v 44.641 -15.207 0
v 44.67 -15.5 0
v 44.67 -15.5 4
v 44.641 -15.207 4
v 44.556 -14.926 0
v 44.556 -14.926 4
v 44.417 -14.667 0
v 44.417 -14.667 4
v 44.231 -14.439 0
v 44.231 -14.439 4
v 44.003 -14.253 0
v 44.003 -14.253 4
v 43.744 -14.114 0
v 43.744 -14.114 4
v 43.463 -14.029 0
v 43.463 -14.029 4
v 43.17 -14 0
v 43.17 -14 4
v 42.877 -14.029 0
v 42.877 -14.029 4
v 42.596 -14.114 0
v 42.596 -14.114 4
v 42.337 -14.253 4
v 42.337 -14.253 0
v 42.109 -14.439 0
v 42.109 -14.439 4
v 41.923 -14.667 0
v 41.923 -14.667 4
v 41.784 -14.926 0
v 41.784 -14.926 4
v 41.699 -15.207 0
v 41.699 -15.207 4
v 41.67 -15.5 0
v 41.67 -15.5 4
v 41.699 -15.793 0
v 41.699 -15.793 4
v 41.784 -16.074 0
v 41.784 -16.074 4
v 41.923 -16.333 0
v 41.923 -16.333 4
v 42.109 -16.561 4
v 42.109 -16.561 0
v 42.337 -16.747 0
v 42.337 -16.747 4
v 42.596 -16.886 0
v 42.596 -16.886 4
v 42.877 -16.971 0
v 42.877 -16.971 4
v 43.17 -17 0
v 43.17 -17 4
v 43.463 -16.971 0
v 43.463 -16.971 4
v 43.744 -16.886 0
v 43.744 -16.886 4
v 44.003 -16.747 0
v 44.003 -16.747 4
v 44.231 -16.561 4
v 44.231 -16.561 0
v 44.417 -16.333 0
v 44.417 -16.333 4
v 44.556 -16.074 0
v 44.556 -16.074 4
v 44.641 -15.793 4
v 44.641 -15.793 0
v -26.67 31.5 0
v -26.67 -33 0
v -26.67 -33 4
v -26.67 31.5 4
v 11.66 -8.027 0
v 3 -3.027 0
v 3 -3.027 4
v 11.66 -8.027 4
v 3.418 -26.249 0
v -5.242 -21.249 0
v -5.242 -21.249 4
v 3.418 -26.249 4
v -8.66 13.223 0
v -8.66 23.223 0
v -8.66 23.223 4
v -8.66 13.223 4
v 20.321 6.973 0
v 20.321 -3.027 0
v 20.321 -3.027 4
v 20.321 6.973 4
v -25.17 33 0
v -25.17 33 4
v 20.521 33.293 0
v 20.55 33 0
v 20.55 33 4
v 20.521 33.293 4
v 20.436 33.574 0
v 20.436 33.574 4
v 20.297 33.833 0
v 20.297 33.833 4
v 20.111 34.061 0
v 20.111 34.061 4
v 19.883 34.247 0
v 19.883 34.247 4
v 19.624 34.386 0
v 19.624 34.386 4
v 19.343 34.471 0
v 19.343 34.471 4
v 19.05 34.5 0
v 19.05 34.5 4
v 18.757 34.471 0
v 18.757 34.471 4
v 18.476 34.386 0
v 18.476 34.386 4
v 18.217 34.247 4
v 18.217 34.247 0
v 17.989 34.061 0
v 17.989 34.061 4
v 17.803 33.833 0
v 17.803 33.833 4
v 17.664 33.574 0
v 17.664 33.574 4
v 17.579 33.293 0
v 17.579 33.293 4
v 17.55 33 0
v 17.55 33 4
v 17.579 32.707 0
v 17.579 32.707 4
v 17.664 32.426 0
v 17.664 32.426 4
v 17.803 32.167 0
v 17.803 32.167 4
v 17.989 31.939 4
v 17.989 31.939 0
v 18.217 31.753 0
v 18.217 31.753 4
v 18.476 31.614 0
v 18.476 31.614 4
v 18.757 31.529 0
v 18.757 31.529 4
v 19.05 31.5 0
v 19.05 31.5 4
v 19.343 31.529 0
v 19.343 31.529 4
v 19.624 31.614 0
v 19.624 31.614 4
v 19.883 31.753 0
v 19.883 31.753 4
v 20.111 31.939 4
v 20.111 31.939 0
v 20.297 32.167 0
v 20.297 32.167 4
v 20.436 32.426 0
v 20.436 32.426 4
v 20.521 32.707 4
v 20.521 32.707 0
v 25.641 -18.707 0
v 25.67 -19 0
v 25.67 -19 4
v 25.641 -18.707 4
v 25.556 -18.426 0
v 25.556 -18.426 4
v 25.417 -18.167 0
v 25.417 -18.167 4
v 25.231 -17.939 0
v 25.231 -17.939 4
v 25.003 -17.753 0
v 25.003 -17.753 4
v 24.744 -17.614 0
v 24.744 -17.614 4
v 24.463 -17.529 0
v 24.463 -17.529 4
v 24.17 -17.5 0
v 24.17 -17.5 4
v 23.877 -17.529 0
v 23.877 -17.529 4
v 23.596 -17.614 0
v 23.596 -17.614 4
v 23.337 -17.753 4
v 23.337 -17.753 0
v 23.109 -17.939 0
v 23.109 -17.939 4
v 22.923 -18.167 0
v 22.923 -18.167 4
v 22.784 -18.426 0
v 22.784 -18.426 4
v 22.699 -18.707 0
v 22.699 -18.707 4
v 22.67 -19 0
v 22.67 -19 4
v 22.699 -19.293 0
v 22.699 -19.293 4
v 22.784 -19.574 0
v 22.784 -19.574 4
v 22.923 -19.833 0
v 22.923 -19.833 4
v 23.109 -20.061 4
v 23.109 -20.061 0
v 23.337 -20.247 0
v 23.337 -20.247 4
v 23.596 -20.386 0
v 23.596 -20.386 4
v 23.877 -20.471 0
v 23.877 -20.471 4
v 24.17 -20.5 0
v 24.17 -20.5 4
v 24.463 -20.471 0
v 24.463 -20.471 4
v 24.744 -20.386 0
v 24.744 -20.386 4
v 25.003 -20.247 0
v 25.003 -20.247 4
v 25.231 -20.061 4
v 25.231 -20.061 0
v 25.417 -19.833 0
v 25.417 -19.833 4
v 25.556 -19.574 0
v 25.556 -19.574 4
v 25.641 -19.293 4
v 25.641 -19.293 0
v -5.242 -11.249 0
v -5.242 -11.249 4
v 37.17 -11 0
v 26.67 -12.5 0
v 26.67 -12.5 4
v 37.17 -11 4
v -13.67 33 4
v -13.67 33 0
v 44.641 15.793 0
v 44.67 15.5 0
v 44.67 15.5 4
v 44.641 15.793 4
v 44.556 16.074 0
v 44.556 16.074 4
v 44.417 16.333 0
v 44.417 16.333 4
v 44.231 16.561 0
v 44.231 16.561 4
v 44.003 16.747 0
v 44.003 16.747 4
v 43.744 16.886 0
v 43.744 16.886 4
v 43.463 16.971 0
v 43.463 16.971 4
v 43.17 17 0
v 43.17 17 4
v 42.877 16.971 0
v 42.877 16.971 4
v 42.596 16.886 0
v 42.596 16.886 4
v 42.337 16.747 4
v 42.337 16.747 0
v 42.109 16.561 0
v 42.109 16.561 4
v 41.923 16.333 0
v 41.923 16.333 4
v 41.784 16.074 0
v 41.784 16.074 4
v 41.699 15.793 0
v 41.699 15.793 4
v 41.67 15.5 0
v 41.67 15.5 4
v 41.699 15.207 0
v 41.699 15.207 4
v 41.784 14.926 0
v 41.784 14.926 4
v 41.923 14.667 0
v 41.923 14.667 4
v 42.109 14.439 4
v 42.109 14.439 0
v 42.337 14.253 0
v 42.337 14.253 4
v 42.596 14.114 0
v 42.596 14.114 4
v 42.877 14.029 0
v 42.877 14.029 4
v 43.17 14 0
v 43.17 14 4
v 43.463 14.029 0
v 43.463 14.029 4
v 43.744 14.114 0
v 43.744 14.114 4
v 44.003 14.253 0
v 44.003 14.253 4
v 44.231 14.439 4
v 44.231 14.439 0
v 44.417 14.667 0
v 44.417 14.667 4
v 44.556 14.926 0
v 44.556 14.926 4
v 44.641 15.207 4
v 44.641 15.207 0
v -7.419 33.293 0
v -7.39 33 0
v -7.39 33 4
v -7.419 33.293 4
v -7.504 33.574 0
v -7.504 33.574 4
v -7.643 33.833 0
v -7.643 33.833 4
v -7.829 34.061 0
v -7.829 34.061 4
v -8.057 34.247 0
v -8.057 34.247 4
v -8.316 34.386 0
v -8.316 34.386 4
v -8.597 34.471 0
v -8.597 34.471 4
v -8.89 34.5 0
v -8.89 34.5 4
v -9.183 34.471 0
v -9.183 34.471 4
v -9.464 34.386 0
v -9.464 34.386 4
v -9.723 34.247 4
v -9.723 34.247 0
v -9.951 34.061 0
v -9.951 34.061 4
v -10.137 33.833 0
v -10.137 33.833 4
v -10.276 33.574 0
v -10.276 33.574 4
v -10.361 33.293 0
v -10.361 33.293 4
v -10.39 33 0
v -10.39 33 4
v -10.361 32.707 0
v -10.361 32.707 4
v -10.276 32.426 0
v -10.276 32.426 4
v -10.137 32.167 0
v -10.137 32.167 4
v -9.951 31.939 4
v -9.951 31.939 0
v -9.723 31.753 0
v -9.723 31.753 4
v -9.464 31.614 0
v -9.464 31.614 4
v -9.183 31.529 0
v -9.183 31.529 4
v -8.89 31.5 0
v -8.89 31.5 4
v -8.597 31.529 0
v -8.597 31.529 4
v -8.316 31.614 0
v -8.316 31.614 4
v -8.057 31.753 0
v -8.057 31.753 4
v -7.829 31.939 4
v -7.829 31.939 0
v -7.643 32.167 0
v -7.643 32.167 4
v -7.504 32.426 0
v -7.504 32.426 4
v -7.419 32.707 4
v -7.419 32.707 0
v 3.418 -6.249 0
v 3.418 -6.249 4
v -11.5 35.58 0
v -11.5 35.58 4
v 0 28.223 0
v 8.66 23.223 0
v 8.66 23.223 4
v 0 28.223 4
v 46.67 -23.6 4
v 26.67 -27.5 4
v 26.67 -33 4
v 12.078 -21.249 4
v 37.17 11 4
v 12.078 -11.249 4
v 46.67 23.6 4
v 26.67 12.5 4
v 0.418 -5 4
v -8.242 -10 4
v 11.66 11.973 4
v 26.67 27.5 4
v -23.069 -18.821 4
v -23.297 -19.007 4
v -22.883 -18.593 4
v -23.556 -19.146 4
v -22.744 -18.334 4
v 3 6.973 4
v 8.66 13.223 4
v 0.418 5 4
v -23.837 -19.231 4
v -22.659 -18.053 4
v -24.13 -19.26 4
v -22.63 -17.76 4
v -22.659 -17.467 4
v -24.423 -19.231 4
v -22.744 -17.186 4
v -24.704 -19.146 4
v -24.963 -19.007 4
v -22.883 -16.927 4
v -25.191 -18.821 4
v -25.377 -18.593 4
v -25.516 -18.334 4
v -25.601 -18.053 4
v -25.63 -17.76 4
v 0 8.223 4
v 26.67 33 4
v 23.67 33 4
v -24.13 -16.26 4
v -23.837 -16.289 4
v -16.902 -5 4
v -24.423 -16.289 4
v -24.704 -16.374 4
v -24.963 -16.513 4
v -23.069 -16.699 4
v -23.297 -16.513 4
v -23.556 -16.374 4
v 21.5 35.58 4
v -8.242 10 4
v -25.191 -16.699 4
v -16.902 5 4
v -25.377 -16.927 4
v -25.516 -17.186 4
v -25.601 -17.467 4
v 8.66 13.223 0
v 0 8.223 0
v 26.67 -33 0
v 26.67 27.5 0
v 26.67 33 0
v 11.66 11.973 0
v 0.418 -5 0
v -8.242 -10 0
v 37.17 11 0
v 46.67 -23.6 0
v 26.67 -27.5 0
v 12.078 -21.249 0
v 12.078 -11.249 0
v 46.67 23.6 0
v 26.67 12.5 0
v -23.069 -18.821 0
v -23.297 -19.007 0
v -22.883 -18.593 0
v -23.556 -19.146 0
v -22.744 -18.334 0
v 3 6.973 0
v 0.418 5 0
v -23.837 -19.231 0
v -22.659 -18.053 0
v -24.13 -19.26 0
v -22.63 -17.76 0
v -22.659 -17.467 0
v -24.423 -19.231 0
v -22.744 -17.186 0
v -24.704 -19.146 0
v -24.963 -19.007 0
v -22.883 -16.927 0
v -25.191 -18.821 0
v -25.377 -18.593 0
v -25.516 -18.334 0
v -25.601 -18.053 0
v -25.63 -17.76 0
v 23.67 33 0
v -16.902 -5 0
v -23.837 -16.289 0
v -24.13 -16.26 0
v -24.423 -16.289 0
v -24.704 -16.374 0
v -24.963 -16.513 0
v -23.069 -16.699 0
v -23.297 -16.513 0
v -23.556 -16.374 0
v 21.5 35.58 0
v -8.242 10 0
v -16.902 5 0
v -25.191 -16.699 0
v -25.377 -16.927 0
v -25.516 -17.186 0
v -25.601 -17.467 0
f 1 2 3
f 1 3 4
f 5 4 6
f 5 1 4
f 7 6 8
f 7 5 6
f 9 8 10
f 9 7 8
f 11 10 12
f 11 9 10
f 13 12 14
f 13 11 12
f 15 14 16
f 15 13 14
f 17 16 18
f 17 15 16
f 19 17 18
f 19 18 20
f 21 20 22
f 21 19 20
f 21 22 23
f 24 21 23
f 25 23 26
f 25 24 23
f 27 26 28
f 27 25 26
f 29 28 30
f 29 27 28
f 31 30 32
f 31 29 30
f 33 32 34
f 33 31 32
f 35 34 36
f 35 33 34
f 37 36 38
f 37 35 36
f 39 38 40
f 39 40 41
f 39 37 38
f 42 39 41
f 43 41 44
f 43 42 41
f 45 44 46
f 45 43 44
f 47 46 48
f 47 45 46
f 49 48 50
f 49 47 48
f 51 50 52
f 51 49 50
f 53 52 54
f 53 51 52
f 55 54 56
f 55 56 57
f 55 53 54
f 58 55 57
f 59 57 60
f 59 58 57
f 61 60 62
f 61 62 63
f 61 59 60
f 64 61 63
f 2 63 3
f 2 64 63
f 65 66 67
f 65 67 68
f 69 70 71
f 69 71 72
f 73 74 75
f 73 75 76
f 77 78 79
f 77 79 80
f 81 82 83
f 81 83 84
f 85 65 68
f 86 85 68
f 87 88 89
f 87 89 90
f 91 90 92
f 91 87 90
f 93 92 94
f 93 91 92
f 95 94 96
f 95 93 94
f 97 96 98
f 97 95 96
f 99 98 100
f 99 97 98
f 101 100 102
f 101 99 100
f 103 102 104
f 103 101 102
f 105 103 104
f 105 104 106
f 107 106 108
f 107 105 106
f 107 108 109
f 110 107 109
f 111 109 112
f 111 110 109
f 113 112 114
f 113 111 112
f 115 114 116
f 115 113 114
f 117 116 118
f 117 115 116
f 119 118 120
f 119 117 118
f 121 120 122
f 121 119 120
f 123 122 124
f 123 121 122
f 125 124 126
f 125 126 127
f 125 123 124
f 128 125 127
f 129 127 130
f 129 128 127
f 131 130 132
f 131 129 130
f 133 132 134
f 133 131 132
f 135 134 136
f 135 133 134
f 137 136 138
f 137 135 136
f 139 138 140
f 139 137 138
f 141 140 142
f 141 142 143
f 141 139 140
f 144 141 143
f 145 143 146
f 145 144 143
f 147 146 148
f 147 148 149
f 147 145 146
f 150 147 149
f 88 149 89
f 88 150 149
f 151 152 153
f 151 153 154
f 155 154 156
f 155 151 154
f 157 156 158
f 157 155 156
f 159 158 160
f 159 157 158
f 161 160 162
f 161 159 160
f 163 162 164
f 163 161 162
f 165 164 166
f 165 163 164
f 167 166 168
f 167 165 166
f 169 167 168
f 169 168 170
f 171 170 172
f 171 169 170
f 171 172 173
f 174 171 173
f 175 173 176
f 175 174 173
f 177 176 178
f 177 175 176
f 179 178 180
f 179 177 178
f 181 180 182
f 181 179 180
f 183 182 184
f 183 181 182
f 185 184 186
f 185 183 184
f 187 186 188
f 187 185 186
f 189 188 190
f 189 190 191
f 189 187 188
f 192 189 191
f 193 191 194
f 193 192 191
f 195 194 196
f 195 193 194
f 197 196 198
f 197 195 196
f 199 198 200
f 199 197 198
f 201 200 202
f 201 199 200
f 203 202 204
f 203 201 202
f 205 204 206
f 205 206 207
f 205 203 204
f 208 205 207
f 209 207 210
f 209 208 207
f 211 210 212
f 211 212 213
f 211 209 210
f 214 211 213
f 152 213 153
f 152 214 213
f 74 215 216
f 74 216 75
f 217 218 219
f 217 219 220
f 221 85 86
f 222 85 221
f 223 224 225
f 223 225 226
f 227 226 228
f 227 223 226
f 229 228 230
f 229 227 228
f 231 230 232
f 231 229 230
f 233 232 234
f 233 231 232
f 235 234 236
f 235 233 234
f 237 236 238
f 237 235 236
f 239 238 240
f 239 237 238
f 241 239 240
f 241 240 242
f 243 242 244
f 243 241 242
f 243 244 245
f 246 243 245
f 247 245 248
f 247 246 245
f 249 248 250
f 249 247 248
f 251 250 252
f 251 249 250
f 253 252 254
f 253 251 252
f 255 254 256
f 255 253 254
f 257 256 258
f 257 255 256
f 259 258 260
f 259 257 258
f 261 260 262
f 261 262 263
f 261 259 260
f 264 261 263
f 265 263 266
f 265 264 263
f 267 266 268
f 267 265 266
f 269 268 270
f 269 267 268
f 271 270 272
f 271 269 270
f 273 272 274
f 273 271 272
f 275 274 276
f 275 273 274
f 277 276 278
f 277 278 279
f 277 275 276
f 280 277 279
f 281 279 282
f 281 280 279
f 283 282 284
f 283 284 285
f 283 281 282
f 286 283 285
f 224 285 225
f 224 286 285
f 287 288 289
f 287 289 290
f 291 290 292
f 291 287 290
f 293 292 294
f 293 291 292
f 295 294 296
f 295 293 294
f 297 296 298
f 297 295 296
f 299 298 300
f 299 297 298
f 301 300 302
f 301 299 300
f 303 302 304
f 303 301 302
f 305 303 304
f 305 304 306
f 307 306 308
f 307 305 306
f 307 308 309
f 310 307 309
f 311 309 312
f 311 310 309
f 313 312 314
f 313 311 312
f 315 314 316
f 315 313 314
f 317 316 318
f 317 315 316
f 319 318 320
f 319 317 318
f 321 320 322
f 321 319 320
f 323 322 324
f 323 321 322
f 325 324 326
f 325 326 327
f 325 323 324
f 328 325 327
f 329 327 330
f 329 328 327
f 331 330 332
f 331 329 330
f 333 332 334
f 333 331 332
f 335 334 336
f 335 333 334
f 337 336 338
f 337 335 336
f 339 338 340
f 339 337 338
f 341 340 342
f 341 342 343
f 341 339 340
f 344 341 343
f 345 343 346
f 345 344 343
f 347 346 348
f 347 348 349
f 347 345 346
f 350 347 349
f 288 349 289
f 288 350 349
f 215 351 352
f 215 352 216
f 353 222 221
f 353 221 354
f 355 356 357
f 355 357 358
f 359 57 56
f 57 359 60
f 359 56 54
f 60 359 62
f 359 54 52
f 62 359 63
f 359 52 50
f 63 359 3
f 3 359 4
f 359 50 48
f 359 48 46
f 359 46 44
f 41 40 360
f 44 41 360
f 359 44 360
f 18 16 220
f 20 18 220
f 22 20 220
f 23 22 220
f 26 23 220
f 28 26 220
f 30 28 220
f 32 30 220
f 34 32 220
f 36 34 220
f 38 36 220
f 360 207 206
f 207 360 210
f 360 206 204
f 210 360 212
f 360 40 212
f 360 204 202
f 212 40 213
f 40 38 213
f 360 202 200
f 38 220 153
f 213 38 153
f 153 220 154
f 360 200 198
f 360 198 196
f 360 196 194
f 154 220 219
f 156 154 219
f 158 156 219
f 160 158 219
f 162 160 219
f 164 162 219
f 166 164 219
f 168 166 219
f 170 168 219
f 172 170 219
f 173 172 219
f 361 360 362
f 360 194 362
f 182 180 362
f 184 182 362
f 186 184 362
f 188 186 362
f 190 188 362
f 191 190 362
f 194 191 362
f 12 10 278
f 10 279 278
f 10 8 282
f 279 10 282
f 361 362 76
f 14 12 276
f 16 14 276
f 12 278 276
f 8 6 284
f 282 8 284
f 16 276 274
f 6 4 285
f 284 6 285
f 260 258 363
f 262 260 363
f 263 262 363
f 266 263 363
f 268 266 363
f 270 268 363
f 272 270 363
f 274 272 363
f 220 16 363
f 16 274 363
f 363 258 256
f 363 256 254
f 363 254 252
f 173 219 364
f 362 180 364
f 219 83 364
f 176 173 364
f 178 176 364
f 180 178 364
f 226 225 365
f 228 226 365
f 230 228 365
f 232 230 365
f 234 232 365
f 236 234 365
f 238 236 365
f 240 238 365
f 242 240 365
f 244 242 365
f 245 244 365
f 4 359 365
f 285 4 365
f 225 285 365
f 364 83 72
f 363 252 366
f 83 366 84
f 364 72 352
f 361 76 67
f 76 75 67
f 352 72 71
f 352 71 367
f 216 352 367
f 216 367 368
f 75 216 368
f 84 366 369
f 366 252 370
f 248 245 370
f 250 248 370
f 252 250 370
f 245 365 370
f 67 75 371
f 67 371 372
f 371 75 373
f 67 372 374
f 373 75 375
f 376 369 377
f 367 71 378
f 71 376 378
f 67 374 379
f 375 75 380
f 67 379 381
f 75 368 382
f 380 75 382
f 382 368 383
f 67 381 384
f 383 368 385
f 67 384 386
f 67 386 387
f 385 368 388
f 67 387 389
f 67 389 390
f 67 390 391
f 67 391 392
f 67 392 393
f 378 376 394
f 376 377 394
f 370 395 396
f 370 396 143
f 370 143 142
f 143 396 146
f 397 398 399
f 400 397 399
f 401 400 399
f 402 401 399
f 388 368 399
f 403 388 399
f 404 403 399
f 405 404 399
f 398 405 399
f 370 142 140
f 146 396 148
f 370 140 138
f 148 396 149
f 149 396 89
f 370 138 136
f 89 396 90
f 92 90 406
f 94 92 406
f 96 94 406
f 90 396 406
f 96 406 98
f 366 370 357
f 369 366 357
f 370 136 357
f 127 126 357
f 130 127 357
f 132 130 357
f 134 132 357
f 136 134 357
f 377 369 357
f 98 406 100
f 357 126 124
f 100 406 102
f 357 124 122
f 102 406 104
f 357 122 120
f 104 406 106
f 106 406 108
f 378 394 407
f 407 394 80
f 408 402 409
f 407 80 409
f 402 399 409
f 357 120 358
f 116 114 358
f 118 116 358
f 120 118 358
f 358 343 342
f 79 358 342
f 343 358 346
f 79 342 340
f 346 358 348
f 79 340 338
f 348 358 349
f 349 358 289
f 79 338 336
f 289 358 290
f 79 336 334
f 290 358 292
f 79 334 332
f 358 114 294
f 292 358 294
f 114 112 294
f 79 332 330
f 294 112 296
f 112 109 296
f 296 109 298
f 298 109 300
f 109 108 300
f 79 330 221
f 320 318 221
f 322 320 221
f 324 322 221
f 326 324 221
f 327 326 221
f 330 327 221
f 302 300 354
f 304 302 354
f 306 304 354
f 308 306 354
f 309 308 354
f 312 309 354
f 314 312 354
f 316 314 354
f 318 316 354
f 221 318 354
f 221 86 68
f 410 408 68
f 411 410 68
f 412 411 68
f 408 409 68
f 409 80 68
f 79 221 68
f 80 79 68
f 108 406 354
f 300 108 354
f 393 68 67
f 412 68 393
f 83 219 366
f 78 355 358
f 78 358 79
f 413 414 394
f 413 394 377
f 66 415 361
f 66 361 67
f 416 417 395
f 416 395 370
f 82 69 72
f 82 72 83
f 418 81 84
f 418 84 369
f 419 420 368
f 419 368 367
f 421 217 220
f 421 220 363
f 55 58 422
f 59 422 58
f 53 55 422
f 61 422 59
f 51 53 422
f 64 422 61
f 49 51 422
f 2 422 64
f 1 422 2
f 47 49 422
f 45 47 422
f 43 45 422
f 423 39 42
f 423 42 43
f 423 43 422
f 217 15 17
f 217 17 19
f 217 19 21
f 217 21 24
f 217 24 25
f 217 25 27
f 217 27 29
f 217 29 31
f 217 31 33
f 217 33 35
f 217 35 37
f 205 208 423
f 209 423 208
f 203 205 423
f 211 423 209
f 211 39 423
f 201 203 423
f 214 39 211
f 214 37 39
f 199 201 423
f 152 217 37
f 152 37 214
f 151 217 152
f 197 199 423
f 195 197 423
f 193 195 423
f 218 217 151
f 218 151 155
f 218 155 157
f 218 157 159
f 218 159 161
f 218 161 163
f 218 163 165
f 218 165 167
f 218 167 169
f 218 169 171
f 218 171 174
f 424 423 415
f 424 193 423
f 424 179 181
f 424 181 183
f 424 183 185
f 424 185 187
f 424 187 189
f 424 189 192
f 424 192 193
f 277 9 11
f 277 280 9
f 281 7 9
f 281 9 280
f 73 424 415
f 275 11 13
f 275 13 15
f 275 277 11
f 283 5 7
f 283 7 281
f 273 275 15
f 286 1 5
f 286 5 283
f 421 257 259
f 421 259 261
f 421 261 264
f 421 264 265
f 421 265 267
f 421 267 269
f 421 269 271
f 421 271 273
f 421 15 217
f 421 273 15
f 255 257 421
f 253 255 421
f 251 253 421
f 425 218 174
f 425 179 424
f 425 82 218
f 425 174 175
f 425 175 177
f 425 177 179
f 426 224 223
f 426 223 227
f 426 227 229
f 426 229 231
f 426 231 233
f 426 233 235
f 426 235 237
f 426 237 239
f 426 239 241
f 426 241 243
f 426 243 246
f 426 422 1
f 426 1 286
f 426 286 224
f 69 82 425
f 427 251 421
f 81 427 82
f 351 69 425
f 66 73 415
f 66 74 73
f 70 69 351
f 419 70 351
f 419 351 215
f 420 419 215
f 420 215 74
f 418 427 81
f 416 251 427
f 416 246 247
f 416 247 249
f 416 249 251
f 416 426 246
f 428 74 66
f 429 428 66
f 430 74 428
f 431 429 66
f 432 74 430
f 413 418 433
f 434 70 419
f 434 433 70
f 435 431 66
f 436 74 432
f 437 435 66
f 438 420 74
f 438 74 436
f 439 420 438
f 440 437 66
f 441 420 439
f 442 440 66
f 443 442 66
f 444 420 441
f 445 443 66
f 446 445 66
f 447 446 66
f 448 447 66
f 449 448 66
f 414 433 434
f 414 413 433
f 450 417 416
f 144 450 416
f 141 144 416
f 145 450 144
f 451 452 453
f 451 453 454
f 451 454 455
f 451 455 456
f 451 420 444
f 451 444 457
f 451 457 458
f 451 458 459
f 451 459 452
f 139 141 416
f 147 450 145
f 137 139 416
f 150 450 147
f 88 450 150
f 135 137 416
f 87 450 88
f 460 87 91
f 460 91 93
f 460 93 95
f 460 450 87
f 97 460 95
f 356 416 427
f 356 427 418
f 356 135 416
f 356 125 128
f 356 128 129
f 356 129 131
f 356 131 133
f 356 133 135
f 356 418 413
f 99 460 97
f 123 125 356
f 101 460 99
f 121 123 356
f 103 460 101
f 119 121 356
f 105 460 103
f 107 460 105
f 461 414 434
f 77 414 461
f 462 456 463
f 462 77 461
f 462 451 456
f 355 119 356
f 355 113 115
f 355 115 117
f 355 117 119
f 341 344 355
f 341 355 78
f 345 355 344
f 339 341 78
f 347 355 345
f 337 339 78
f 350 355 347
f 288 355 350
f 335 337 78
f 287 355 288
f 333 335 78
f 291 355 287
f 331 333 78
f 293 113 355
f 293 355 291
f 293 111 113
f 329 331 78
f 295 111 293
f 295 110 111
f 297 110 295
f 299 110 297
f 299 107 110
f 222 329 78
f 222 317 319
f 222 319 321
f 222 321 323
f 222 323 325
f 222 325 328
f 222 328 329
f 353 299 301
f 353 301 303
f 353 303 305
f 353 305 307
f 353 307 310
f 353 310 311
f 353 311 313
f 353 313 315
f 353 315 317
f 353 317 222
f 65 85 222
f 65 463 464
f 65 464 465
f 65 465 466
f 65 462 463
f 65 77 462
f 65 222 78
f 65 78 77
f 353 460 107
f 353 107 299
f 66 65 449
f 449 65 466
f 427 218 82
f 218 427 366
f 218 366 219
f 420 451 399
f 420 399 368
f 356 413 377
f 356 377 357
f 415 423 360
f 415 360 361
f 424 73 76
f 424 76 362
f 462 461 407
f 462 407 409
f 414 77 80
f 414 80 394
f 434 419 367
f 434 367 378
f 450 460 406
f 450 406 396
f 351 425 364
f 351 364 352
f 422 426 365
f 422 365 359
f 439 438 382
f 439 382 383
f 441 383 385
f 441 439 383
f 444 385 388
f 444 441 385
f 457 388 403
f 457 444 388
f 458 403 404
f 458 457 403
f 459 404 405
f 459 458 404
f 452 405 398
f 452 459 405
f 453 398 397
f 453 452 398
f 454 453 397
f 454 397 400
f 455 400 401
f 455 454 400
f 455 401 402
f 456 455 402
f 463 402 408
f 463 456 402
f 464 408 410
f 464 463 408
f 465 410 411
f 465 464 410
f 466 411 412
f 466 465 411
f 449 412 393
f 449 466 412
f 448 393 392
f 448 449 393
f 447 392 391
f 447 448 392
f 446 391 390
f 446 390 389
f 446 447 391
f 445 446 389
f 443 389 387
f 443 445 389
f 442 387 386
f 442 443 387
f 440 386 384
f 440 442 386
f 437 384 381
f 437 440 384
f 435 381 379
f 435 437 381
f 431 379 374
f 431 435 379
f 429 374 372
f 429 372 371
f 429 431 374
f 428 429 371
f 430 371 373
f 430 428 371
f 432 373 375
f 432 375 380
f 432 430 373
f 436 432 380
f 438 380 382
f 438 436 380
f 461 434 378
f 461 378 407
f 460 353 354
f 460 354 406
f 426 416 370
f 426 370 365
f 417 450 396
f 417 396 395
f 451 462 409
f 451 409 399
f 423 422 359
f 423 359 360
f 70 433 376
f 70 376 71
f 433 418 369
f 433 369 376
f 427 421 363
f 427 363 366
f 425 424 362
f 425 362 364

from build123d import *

# Parameters (mm, degrees)
SKETCH_R     = 1.5
PAD_DEPTH    = 4
CHAMFER_SIZE = 1.5


with BuildPart() as part:
    # Sketch → Pad (new body)
    with BuildSketch(Plane.XY):
        Polygon((-11.5, 35.58), (21.5, 35.58), (23.67, 33), (26.67, 33), (26.67, 27.5), (46.67, 23.6), (46.67, -23.6), (26.67, -27.5), (26.67, -33), (-26.67, -33), (-26.67, 33), (-13.67, 33), align=None)
        with Locations((43.17, 15.5)):
            Circle(SKETCH_R, mode=Mode.SUBTRACT)
        with Locations((43.17, -15.5)):
            Circle(SKETCH_R, mode=Mode.SUBTRACT)
        with Locations((19.05, 33)):
            Circle(SKETCH_R, mode=Mode.SUBTRACT)
        with Locations((-8.89, 33)):
            Circle(SKETCH_R, mode=Mode.SUBTRACT)
        with Locations((-24.13, -17.76)):
            Circle(SKETCH_R, mode=Mode.SUBTRACT)
        with Locations((24.17, -19)):
            Circle(SKETCH_R, mode=Mode.SUBTRACT)
        Polygon((8.660254, 13.222707), (8.660254, 23.222707), (0, 28.222707), (-8.660254, 23.222707), (-8.660254, 13.222707), (0, 8.222707), align=None, mode=Mode.SUBTRACT)
        Polygon((20.320508, -3.026554), (20.320508, 6.973446), (11.660254, 11.973446), (3, 6.973446), (3, -3.026554), (11.660254, -8.026554), align=None, mode=Mode.SUBTRACT)
        Polygon((0.418108, -5), (0.418108, 5), (-8.242146, 10), (-16.9024, 5), (-16.9024, -5), (-8.242146, -10), align=None, mode=Mode.SUBTRACT)
        Polygon((12.078362, -21.249261), (12.078362, -11.249261), (3.418108, -6.249261), (-5.242146, -11.249261), (-5.242146, -21.249261), (3.418108, -26.249261), align=None, mode=Mode.SUBTRACT)
        Polygon((26.67, 12.5), (26.67, -12.5), (37.17, -11), (37.17, 11), align=None, mode=Mode.SUBTRACT)
    extrude(amount=PAD_DEPTH)

    # Chamfer
    chamfer_edges = [part.edges().sort_by_distance(p)[0] for p in [
        (-26.67, 33, 2),
    ]]
    chamfer(chamfer_edges, length=CHAMFER_SIZE)


solid = part.part
